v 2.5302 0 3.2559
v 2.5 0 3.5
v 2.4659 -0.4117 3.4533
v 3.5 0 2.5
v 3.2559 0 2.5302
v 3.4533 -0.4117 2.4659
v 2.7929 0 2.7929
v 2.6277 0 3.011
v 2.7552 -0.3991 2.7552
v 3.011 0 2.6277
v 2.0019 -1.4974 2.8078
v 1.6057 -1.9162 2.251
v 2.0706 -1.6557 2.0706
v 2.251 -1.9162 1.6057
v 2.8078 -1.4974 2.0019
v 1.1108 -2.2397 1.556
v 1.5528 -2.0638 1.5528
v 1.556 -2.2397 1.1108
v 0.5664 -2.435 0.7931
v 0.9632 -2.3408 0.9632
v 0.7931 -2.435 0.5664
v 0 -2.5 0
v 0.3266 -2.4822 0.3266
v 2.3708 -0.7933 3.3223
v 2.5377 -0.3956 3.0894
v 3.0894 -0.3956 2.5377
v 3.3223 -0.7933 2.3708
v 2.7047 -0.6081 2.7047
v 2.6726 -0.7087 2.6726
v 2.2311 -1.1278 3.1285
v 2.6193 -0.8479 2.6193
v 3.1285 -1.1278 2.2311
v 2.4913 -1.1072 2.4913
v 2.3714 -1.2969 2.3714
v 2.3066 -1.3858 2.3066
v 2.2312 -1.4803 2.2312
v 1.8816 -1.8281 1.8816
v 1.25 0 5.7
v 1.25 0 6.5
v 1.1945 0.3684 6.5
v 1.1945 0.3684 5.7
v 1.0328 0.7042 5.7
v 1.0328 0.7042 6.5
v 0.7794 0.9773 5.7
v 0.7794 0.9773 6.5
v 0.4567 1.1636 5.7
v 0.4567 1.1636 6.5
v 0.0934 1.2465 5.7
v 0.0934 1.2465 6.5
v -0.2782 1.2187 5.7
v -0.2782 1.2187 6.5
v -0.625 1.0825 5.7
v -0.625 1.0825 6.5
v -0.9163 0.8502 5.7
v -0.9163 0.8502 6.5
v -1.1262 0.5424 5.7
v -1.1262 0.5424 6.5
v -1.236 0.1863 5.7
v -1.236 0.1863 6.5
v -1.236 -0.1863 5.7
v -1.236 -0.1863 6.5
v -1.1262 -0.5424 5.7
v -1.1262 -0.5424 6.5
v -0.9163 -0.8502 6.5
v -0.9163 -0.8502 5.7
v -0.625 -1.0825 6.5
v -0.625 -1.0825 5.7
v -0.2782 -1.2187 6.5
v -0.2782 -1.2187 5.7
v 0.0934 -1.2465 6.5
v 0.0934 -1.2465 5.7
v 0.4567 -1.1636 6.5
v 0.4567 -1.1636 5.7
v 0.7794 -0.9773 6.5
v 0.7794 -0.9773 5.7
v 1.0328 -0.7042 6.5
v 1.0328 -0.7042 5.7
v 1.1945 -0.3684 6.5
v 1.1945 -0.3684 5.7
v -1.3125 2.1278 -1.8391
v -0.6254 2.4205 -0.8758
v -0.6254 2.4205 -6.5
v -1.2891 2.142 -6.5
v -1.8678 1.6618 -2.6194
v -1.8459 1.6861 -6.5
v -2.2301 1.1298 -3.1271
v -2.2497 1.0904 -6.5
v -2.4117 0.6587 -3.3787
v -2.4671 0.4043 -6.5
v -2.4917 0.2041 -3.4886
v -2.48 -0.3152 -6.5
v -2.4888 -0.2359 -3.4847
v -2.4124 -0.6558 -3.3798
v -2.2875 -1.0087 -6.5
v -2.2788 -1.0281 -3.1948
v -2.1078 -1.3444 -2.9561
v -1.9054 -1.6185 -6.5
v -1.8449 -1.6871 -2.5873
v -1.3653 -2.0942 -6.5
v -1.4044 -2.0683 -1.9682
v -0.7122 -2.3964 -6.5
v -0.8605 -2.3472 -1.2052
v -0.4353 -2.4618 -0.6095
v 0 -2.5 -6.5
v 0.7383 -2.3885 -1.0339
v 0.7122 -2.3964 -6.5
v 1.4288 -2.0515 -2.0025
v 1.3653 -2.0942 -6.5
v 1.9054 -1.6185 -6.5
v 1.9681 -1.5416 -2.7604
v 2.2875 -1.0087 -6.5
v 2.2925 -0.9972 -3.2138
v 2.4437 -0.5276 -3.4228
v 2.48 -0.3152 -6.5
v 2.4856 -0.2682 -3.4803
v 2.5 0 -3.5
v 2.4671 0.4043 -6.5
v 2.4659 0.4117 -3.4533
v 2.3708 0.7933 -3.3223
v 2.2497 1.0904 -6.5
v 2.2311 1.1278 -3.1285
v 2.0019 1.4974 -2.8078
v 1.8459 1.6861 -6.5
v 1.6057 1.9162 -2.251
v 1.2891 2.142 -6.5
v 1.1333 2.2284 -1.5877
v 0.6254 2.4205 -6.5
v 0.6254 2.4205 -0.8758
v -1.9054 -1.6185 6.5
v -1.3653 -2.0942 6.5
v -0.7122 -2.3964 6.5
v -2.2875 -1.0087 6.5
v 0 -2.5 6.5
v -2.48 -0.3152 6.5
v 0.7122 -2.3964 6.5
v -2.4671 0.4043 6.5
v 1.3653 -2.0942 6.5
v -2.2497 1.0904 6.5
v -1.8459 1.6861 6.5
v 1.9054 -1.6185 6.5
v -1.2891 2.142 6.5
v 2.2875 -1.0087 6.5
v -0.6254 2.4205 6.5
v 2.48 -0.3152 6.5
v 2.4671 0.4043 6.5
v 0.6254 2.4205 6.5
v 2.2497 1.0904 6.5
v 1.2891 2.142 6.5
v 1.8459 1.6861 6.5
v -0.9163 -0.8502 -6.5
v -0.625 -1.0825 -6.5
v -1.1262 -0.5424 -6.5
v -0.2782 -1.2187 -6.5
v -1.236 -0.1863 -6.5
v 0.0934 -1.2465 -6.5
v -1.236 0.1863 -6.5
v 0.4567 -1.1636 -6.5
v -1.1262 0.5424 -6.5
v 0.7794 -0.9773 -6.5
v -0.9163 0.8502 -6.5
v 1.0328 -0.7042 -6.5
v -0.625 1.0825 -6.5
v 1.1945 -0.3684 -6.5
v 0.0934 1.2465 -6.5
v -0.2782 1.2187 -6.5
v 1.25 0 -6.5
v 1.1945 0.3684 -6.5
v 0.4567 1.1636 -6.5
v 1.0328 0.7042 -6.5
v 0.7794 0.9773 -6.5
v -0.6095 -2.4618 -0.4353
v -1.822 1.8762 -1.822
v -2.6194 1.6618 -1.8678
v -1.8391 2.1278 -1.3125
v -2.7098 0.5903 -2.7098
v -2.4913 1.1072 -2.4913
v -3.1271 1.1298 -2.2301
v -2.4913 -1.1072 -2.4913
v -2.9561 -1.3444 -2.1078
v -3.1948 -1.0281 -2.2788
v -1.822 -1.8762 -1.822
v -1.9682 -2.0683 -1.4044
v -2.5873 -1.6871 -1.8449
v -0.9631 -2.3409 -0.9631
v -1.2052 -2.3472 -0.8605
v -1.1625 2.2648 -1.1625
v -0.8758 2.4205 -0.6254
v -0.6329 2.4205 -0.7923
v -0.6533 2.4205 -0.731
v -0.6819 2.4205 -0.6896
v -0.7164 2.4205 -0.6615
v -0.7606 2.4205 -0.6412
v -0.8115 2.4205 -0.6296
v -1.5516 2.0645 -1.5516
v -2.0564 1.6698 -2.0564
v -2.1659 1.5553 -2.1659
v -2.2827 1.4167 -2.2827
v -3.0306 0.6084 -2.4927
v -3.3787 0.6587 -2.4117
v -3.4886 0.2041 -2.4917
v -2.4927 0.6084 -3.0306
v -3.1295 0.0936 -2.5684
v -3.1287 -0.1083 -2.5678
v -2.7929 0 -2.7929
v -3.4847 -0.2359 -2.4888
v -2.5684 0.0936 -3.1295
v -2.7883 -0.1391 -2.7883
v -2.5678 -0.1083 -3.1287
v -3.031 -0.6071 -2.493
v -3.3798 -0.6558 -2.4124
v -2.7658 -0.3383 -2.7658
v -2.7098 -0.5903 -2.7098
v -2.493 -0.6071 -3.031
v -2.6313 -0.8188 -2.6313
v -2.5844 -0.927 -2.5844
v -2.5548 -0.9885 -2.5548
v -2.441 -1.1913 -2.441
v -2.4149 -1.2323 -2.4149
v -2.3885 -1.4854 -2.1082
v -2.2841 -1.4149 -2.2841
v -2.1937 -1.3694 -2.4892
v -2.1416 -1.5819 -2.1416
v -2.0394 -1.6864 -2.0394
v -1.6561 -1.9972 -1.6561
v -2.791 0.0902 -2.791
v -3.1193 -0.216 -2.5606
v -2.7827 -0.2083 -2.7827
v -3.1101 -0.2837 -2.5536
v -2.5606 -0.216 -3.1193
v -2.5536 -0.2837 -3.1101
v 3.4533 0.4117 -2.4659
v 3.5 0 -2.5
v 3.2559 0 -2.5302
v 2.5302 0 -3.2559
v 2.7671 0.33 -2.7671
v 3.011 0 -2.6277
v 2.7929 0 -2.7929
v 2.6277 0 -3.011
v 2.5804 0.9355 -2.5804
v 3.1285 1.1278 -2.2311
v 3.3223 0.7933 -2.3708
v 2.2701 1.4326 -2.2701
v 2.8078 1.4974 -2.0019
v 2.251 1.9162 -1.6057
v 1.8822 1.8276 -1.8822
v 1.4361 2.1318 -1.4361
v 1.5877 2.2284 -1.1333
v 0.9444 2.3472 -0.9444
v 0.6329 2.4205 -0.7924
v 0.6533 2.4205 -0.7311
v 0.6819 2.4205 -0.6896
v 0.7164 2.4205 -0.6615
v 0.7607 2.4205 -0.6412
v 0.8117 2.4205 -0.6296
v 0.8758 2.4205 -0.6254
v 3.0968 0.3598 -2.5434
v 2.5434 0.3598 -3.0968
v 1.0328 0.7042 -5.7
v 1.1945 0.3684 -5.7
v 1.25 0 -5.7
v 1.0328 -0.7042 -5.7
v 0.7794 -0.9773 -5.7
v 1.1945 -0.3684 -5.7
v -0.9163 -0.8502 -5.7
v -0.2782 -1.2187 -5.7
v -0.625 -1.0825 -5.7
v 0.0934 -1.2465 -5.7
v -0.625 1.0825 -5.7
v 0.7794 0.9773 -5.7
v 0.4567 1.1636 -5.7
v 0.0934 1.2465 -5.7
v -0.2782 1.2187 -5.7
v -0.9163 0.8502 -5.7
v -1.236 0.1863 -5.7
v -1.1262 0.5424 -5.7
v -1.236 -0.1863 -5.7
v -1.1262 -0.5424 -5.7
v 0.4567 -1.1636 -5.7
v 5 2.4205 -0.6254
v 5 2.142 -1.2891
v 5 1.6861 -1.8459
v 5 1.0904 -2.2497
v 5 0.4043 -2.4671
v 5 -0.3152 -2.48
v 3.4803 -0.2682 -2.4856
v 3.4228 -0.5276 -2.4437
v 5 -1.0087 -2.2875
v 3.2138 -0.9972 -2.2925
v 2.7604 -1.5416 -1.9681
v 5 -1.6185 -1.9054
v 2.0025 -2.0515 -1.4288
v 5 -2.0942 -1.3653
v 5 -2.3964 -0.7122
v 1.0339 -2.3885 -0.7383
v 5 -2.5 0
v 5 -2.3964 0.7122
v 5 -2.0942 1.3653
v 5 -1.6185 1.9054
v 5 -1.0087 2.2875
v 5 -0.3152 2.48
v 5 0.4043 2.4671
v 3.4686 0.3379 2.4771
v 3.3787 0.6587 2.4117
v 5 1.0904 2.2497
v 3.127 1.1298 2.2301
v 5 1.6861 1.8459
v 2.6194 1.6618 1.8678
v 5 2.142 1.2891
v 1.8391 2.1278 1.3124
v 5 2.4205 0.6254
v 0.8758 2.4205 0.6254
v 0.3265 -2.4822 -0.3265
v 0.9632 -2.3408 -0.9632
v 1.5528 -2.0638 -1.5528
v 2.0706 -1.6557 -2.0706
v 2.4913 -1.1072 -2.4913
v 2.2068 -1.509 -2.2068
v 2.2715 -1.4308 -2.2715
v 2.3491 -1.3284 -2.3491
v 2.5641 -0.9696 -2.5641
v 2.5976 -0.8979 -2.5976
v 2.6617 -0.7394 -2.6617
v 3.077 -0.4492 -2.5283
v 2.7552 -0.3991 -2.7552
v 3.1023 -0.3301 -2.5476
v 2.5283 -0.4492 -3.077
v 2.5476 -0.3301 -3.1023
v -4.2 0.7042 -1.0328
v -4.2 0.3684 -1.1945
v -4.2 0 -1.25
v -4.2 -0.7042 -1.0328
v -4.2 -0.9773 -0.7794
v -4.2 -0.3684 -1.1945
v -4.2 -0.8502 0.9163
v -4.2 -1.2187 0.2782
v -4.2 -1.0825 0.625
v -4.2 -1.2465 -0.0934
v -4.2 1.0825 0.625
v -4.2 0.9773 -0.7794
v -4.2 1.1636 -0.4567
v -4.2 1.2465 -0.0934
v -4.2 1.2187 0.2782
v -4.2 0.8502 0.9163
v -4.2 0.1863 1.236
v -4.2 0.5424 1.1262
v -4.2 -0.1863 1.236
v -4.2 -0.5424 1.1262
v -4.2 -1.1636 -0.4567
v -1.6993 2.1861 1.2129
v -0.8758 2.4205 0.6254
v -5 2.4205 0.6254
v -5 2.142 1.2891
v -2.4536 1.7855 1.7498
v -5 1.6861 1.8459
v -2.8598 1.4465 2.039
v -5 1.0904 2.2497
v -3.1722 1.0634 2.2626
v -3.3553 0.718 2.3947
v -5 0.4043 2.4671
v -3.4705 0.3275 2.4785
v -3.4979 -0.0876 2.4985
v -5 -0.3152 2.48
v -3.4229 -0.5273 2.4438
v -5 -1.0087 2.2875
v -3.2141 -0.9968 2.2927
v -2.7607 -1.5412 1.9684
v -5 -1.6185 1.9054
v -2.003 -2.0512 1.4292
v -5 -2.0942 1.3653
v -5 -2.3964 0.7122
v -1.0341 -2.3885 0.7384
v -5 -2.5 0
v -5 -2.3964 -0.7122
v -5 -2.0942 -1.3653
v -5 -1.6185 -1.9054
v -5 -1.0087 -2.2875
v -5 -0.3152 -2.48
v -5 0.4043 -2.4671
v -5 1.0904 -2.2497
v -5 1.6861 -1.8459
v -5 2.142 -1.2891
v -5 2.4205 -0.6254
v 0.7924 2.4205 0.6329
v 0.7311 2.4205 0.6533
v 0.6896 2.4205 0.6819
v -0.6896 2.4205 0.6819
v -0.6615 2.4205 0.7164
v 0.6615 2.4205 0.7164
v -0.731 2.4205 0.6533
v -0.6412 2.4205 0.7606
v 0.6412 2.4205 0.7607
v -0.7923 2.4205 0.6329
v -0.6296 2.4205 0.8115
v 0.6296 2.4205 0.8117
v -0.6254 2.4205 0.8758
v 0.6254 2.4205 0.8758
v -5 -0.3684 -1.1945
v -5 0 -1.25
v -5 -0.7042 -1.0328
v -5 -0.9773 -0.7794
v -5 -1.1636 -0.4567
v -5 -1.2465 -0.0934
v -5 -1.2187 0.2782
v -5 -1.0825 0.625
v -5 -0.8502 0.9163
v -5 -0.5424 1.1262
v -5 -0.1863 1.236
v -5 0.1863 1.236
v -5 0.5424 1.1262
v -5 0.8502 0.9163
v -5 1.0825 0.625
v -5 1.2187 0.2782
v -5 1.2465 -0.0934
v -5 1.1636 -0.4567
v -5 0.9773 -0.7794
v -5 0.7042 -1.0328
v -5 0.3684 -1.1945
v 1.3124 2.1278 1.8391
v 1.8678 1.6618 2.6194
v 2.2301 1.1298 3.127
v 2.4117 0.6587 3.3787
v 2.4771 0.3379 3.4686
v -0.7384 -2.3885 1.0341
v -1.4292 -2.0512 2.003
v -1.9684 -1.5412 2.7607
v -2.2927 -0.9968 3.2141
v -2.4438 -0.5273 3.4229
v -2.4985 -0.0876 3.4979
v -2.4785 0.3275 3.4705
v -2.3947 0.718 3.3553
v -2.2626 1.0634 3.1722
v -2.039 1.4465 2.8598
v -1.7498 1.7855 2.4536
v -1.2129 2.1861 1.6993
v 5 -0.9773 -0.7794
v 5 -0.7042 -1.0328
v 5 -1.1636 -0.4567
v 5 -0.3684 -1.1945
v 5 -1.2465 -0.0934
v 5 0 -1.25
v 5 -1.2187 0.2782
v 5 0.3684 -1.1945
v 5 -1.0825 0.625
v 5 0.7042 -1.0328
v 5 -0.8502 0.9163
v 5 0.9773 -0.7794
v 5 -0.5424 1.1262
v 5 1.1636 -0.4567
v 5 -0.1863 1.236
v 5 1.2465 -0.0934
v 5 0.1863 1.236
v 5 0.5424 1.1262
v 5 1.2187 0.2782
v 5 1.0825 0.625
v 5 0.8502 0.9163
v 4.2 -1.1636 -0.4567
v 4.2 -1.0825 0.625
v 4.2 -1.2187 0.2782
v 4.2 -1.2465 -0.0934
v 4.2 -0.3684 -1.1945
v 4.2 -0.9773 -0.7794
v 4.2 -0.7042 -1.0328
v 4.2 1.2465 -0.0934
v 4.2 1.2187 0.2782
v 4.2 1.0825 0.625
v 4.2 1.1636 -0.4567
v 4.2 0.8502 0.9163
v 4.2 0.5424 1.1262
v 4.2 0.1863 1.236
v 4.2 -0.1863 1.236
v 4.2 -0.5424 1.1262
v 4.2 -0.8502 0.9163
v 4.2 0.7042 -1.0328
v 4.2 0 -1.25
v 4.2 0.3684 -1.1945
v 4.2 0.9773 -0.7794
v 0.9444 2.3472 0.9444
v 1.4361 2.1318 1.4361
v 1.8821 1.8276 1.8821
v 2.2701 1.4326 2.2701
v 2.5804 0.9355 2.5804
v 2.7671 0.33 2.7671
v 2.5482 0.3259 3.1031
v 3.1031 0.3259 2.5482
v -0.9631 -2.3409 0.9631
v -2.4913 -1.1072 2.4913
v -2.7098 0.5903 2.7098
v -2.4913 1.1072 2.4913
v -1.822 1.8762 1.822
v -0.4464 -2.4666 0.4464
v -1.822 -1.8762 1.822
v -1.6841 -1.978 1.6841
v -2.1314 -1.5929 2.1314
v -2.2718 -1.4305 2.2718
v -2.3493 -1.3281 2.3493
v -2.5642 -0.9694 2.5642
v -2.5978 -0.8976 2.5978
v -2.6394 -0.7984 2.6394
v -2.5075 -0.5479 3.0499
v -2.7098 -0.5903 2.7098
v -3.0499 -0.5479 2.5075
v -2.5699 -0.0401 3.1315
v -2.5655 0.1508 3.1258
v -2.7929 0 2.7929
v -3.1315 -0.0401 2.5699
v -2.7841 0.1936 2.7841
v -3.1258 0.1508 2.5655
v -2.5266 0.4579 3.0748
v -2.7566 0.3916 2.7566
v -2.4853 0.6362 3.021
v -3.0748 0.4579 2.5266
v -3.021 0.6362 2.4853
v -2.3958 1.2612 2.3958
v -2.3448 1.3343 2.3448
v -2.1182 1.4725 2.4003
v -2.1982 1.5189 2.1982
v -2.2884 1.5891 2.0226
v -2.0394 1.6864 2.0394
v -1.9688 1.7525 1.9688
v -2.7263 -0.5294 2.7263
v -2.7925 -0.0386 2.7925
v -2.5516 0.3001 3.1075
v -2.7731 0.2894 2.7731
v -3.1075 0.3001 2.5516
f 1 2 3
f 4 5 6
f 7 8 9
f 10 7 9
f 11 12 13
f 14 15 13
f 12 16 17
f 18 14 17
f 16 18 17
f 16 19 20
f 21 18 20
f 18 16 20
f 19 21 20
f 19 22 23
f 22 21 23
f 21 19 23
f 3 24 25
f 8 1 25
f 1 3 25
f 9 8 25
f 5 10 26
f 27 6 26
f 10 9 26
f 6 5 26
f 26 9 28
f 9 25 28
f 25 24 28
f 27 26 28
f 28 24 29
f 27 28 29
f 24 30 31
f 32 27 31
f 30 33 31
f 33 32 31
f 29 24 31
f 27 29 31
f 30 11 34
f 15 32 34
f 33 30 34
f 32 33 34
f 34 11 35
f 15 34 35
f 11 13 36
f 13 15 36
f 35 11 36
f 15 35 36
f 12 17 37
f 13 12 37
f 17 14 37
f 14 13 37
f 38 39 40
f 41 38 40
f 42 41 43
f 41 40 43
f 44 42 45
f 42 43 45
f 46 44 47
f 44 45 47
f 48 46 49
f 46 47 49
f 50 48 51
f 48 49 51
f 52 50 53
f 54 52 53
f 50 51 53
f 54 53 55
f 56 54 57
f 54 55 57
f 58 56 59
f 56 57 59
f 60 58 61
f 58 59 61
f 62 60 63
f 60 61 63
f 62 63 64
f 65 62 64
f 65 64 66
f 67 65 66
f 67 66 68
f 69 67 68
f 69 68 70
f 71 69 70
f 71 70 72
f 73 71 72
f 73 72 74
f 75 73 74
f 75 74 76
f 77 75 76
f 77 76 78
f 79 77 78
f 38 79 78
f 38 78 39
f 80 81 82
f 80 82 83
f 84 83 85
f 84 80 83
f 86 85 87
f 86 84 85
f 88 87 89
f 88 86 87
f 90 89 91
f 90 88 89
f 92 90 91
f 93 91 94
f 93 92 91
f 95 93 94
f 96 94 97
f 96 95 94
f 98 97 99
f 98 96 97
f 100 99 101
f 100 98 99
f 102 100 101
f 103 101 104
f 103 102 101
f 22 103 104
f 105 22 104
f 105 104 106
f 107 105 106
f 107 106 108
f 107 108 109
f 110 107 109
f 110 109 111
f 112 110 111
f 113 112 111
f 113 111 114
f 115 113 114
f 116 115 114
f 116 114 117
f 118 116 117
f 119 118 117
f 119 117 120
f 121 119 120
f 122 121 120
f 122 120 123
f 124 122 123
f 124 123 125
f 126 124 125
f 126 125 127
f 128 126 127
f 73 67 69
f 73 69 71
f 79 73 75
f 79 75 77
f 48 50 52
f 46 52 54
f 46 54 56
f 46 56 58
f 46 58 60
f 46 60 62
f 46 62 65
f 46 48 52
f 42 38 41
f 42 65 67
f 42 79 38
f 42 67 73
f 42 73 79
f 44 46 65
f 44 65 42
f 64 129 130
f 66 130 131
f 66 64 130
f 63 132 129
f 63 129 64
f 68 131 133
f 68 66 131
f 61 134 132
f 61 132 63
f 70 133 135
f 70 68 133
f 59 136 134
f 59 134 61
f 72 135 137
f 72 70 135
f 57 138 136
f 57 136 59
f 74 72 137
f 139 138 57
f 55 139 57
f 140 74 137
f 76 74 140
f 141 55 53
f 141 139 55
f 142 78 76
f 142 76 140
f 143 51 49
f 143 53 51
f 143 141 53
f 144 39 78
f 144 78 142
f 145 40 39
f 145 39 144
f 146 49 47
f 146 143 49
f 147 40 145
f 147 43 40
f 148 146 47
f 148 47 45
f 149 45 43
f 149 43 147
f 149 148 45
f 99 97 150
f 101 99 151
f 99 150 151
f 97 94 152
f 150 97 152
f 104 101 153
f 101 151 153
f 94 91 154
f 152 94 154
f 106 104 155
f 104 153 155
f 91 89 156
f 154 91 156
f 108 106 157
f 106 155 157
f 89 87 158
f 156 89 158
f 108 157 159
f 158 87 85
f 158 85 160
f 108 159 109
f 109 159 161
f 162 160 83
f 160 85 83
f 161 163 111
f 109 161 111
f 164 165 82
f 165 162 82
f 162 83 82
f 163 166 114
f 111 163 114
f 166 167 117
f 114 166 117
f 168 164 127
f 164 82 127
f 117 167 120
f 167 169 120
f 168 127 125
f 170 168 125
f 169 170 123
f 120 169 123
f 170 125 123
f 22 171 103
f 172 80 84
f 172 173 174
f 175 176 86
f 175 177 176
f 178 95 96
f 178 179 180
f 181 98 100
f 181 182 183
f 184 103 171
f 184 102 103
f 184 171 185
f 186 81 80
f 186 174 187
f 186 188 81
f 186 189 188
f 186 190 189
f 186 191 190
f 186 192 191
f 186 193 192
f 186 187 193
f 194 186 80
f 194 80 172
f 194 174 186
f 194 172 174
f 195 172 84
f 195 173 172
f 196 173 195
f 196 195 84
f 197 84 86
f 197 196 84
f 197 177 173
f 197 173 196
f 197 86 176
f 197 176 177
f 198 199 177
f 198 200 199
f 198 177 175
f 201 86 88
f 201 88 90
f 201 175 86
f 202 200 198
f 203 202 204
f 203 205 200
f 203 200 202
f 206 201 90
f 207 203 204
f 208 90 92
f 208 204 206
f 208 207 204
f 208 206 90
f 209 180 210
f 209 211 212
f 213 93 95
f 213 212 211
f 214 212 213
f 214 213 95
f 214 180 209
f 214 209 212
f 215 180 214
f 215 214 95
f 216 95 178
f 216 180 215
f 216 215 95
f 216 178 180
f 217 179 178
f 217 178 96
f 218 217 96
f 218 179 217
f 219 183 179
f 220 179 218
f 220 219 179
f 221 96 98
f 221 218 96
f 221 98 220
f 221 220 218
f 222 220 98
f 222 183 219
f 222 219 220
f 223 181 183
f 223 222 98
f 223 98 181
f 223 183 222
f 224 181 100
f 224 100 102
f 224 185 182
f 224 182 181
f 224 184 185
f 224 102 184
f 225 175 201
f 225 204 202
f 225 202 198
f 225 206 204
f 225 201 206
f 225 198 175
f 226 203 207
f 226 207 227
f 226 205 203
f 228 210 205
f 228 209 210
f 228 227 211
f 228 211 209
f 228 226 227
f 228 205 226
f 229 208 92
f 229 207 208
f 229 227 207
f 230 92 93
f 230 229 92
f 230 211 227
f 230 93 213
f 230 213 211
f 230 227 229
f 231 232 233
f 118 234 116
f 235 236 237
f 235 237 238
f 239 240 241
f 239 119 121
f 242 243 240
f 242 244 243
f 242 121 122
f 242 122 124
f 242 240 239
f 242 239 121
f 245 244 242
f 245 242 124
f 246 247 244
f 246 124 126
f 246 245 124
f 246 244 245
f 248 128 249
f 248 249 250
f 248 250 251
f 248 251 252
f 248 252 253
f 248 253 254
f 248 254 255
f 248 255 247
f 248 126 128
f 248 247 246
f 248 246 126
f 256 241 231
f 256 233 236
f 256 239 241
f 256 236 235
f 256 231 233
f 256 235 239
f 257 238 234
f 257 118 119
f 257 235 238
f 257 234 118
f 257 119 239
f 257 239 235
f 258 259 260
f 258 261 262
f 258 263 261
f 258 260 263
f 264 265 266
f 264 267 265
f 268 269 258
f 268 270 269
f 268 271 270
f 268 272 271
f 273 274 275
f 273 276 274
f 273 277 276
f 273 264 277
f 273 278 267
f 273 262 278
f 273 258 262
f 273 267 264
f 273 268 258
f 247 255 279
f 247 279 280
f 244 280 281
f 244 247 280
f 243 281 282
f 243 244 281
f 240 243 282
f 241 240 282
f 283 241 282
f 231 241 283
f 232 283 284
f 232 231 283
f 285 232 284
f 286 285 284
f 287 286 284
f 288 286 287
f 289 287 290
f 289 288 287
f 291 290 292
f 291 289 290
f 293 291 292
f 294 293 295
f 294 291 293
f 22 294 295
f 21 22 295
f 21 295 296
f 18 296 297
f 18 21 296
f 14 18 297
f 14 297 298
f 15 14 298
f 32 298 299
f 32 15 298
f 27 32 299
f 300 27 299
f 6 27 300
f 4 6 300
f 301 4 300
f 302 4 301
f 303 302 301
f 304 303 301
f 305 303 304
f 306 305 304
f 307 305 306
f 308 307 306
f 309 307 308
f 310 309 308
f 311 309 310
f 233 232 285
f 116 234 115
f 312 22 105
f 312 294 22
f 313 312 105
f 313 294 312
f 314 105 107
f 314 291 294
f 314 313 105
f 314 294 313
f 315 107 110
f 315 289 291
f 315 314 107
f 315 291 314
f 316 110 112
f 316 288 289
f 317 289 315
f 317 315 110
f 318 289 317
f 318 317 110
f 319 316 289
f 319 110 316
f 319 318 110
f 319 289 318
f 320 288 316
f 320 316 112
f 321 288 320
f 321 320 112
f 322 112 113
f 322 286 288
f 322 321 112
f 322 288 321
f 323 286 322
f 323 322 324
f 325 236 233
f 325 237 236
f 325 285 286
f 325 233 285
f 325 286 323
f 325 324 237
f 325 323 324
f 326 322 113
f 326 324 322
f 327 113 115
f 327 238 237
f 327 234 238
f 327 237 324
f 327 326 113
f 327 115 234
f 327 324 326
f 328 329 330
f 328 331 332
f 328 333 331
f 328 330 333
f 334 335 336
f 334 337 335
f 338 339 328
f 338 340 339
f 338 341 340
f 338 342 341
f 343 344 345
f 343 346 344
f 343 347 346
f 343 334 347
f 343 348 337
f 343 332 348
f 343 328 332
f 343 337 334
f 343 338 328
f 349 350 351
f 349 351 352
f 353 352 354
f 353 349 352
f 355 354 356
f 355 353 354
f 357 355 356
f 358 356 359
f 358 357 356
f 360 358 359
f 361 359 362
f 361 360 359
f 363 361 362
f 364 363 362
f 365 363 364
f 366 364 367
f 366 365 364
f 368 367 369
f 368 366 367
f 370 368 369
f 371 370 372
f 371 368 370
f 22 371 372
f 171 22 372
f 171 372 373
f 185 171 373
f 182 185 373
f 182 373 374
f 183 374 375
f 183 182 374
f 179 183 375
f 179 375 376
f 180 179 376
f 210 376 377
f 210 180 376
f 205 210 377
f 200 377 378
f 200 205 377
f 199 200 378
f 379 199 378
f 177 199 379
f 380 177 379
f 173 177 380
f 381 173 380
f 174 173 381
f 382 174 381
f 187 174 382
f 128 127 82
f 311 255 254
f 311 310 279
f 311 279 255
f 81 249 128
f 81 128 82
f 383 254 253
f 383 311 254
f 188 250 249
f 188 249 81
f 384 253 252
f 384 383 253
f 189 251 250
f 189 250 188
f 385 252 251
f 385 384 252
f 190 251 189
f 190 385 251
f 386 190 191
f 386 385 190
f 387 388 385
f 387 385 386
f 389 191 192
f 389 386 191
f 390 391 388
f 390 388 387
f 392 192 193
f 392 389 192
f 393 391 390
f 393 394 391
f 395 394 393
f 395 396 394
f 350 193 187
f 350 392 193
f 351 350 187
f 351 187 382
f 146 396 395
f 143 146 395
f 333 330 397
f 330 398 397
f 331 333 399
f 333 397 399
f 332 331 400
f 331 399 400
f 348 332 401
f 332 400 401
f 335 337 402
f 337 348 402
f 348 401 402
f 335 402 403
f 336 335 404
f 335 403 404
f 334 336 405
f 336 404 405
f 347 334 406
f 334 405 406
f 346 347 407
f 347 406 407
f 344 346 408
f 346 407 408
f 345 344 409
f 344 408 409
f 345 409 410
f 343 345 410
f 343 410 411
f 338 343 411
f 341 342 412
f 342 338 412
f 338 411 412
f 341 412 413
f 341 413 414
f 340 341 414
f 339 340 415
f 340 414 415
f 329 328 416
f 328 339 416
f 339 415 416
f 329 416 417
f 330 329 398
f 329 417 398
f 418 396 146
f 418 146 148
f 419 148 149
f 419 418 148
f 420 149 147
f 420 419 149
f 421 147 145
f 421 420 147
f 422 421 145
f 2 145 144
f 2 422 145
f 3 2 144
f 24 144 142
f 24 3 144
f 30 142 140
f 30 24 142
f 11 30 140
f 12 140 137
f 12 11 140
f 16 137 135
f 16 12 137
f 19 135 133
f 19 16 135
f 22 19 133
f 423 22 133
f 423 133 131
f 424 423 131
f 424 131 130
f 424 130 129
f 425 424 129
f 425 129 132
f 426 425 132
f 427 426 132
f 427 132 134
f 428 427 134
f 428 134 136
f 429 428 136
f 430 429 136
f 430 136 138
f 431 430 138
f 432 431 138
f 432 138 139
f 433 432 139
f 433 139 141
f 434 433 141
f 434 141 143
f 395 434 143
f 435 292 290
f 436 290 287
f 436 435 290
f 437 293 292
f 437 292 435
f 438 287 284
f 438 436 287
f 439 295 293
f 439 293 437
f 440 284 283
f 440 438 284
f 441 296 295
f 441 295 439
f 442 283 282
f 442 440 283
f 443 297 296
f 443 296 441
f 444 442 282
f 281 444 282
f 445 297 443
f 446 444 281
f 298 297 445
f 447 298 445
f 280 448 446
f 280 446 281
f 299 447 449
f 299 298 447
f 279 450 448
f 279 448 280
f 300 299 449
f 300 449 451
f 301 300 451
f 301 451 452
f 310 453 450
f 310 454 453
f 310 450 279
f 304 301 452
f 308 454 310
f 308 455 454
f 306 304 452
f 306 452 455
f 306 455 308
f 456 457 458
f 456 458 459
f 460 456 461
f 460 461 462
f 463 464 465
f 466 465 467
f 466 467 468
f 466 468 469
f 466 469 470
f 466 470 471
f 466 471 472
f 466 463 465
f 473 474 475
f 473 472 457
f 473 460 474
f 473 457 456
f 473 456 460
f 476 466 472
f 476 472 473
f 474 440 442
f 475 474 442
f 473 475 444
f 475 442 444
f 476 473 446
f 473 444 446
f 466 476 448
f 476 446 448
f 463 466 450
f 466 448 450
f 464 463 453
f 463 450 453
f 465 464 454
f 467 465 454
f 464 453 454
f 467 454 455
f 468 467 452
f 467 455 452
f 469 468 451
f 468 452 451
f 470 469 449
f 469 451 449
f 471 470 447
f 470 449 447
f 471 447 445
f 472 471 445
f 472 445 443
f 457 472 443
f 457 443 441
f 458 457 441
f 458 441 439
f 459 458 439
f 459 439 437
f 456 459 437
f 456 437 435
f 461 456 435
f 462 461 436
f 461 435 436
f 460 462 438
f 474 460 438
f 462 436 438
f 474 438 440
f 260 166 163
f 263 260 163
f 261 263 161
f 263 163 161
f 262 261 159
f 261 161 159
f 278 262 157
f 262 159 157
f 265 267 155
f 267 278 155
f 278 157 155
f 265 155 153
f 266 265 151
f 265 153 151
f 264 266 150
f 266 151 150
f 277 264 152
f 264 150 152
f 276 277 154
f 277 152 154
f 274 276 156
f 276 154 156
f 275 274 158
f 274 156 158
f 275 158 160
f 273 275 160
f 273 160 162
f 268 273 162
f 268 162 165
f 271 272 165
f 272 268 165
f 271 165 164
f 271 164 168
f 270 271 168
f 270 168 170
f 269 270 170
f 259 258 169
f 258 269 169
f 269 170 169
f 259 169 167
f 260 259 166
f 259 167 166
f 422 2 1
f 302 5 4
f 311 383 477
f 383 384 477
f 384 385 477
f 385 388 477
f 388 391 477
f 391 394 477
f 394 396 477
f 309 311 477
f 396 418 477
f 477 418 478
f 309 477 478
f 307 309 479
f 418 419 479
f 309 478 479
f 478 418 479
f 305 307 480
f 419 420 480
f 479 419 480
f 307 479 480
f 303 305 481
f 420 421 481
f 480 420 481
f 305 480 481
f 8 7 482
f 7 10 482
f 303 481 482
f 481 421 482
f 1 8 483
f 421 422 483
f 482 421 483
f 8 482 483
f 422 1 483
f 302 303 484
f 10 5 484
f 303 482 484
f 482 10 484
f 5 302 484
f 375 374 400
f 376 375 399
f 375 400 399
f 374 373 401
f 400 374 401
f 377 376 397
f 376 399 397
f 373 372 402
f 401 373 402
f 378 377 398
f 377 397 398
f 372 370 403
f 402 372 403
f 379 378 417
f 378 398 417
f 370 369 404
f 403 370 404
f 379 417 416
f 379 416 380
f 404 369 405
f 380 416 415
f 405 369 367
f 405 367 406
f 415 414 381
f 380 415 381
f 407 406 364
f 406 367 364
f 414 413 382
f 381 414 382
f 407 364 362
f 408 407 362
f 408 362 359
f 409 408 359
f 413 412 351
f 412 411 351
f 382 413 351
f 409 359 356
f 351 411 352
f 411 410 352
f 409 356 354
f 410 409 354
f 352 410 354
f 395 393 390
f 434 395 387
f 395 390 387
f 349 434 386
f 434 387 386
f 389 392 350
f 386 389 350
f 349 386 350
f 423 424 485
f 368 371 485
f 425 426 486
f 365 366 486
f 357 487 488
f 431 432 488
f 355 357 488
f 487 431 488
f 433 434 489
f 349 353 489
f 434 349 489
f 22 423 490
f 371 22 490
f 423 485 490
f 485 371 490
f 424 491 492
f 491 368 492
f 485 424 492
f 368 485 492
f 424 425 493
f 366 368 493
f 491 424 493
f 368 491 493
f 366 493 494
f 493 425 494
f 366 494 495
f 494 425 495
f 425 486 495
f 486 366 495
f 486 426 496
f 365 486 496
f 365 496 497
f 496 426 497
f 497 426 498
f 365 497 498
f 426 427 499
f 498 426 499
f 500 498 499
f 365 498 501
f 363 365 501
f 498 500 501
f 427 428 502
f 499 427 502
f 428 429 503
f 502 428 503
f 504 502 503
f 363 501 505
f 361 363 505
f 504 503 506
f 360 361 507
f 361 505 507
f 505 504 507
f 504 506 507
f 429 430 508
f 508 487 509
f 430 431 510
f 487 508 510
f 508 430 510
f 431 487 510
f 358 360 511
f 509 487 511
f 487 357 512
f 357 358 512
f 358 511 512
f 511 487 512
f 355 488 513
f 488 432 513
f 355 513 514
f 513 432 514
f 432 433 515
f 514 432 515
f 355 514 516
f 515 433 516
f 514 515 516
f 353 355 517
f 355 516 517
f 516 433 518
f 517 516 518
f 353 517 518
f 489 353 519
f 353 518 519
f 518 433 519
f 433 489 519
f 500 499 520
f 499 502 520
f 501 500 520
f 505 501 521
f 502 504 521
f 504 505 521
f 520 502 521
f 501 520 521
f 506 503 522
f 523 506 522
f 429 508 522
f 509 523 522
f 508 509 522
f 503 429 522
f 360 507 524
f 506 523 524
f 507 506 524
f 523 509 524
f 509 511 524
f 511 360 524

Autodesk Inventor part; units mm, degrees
ref_plane "YZ Plane" through (0, 0, 0) normal (1, 0, 0) x (0, 1, 0)
ref_plane "XZ Plane" through (0, 0, 0) normal (0, 1, 0) x (-1, 0, 0)
ref_plane "XY Plane" through (0, 0, 0) normal (0, 0, 1) x (1, 0, 0)
sketch "Sketch1" plane through (0, 0, 0) normal (0, 0, 1) x (1, 0, 0)
  circle A0 centre (0, 0) radius 2.5
  dimension "d0" = 5
extrude "Extrusion1" add sketch "Sketch1" along normal mid plane 13
sketch "Sketch2" plane through (0, 0, 6.5) normal (0, 0, 1) x (1, 0, 0)
  circle A0 centre (0, 0) radius 1.25
  dimension "d3" = 2.5
extrude "Extrusion2" cut sketch "Sketch2" against normal blind 0.8
mirror "Mirror1" about plane through (0, 0, 0) normal (0, 0, 1) of "Extrusion2"
sketch "Sketch3" plane through (0, 0, 0) normal (1, 0, 0) x (0, 1, 0)
  circle A0 centre (0, 0) radius 2.5
  dimension "d6" = 5
extrude "Extrusion3" add sketch "Sketch3" along normal mid plane 10
sketch "Sketch4" plane through (5, 0, 0) normal (1, 0, 0) x (0, 0, -1)
  circle A0 centre (0, 0) radius 1.25
  dimension "d9" = 2.5
extrude "Extrusion4" cut sketch "Sketch4" against normal blind 0.8
mirror "Mirror2" about plane through (0, 0, 0) normal (1, 0, 0) of "Extrusion4"
fillet "Fillet1" radius 1 6 edges at (1.7678, 1.7678, 1.7678) (-2.5, 0, 2.5) (1.7678, -1.7678, 1.7678) (1.7678, -1.7678, -1.7678) (1.7678, 1.7678, -1.7678) (-2.5, 0, -2.5)
sketch "Sketch5" plane through (0, 0, 6.5) normal (0, 0, 1) x (1, 0, 0)
  circle A0 centre (0, 0) radius 2.5 projected
  line L0 (0, 2.5) -> (5.3723, 2.5)
  line L1 (5.3723, 2.5) -> (5.3723, 2.4205)
  line L2 (5.3723, 2.4205) -> (0, 2.4205)
  line L3 (0, 2.4205) -> (0, 2.5)
  line L4 (0, 2.5) -> (-5.4474, 2.5)
  line L5 (-5.4474, 2.5) -> (-5.4474, 2.4205)
  line L6 (-5.4474, 2.4205) -> (0, 2.4205)
  line L7 (0, 2.4205) -> (0, 2.5)
extrude "Extrusion5" cut sketch "Sketch5" against normal through all contours L2 L3 A0 | A0 L0 L1 L2 | L6 L5 L4 A0 | A0 L3 L6
ref_plane "Work Plane1" through (0, 0, 0) normal (0, 0, 1) x (1, 0, 0)
properties part number "_3DPrint"
